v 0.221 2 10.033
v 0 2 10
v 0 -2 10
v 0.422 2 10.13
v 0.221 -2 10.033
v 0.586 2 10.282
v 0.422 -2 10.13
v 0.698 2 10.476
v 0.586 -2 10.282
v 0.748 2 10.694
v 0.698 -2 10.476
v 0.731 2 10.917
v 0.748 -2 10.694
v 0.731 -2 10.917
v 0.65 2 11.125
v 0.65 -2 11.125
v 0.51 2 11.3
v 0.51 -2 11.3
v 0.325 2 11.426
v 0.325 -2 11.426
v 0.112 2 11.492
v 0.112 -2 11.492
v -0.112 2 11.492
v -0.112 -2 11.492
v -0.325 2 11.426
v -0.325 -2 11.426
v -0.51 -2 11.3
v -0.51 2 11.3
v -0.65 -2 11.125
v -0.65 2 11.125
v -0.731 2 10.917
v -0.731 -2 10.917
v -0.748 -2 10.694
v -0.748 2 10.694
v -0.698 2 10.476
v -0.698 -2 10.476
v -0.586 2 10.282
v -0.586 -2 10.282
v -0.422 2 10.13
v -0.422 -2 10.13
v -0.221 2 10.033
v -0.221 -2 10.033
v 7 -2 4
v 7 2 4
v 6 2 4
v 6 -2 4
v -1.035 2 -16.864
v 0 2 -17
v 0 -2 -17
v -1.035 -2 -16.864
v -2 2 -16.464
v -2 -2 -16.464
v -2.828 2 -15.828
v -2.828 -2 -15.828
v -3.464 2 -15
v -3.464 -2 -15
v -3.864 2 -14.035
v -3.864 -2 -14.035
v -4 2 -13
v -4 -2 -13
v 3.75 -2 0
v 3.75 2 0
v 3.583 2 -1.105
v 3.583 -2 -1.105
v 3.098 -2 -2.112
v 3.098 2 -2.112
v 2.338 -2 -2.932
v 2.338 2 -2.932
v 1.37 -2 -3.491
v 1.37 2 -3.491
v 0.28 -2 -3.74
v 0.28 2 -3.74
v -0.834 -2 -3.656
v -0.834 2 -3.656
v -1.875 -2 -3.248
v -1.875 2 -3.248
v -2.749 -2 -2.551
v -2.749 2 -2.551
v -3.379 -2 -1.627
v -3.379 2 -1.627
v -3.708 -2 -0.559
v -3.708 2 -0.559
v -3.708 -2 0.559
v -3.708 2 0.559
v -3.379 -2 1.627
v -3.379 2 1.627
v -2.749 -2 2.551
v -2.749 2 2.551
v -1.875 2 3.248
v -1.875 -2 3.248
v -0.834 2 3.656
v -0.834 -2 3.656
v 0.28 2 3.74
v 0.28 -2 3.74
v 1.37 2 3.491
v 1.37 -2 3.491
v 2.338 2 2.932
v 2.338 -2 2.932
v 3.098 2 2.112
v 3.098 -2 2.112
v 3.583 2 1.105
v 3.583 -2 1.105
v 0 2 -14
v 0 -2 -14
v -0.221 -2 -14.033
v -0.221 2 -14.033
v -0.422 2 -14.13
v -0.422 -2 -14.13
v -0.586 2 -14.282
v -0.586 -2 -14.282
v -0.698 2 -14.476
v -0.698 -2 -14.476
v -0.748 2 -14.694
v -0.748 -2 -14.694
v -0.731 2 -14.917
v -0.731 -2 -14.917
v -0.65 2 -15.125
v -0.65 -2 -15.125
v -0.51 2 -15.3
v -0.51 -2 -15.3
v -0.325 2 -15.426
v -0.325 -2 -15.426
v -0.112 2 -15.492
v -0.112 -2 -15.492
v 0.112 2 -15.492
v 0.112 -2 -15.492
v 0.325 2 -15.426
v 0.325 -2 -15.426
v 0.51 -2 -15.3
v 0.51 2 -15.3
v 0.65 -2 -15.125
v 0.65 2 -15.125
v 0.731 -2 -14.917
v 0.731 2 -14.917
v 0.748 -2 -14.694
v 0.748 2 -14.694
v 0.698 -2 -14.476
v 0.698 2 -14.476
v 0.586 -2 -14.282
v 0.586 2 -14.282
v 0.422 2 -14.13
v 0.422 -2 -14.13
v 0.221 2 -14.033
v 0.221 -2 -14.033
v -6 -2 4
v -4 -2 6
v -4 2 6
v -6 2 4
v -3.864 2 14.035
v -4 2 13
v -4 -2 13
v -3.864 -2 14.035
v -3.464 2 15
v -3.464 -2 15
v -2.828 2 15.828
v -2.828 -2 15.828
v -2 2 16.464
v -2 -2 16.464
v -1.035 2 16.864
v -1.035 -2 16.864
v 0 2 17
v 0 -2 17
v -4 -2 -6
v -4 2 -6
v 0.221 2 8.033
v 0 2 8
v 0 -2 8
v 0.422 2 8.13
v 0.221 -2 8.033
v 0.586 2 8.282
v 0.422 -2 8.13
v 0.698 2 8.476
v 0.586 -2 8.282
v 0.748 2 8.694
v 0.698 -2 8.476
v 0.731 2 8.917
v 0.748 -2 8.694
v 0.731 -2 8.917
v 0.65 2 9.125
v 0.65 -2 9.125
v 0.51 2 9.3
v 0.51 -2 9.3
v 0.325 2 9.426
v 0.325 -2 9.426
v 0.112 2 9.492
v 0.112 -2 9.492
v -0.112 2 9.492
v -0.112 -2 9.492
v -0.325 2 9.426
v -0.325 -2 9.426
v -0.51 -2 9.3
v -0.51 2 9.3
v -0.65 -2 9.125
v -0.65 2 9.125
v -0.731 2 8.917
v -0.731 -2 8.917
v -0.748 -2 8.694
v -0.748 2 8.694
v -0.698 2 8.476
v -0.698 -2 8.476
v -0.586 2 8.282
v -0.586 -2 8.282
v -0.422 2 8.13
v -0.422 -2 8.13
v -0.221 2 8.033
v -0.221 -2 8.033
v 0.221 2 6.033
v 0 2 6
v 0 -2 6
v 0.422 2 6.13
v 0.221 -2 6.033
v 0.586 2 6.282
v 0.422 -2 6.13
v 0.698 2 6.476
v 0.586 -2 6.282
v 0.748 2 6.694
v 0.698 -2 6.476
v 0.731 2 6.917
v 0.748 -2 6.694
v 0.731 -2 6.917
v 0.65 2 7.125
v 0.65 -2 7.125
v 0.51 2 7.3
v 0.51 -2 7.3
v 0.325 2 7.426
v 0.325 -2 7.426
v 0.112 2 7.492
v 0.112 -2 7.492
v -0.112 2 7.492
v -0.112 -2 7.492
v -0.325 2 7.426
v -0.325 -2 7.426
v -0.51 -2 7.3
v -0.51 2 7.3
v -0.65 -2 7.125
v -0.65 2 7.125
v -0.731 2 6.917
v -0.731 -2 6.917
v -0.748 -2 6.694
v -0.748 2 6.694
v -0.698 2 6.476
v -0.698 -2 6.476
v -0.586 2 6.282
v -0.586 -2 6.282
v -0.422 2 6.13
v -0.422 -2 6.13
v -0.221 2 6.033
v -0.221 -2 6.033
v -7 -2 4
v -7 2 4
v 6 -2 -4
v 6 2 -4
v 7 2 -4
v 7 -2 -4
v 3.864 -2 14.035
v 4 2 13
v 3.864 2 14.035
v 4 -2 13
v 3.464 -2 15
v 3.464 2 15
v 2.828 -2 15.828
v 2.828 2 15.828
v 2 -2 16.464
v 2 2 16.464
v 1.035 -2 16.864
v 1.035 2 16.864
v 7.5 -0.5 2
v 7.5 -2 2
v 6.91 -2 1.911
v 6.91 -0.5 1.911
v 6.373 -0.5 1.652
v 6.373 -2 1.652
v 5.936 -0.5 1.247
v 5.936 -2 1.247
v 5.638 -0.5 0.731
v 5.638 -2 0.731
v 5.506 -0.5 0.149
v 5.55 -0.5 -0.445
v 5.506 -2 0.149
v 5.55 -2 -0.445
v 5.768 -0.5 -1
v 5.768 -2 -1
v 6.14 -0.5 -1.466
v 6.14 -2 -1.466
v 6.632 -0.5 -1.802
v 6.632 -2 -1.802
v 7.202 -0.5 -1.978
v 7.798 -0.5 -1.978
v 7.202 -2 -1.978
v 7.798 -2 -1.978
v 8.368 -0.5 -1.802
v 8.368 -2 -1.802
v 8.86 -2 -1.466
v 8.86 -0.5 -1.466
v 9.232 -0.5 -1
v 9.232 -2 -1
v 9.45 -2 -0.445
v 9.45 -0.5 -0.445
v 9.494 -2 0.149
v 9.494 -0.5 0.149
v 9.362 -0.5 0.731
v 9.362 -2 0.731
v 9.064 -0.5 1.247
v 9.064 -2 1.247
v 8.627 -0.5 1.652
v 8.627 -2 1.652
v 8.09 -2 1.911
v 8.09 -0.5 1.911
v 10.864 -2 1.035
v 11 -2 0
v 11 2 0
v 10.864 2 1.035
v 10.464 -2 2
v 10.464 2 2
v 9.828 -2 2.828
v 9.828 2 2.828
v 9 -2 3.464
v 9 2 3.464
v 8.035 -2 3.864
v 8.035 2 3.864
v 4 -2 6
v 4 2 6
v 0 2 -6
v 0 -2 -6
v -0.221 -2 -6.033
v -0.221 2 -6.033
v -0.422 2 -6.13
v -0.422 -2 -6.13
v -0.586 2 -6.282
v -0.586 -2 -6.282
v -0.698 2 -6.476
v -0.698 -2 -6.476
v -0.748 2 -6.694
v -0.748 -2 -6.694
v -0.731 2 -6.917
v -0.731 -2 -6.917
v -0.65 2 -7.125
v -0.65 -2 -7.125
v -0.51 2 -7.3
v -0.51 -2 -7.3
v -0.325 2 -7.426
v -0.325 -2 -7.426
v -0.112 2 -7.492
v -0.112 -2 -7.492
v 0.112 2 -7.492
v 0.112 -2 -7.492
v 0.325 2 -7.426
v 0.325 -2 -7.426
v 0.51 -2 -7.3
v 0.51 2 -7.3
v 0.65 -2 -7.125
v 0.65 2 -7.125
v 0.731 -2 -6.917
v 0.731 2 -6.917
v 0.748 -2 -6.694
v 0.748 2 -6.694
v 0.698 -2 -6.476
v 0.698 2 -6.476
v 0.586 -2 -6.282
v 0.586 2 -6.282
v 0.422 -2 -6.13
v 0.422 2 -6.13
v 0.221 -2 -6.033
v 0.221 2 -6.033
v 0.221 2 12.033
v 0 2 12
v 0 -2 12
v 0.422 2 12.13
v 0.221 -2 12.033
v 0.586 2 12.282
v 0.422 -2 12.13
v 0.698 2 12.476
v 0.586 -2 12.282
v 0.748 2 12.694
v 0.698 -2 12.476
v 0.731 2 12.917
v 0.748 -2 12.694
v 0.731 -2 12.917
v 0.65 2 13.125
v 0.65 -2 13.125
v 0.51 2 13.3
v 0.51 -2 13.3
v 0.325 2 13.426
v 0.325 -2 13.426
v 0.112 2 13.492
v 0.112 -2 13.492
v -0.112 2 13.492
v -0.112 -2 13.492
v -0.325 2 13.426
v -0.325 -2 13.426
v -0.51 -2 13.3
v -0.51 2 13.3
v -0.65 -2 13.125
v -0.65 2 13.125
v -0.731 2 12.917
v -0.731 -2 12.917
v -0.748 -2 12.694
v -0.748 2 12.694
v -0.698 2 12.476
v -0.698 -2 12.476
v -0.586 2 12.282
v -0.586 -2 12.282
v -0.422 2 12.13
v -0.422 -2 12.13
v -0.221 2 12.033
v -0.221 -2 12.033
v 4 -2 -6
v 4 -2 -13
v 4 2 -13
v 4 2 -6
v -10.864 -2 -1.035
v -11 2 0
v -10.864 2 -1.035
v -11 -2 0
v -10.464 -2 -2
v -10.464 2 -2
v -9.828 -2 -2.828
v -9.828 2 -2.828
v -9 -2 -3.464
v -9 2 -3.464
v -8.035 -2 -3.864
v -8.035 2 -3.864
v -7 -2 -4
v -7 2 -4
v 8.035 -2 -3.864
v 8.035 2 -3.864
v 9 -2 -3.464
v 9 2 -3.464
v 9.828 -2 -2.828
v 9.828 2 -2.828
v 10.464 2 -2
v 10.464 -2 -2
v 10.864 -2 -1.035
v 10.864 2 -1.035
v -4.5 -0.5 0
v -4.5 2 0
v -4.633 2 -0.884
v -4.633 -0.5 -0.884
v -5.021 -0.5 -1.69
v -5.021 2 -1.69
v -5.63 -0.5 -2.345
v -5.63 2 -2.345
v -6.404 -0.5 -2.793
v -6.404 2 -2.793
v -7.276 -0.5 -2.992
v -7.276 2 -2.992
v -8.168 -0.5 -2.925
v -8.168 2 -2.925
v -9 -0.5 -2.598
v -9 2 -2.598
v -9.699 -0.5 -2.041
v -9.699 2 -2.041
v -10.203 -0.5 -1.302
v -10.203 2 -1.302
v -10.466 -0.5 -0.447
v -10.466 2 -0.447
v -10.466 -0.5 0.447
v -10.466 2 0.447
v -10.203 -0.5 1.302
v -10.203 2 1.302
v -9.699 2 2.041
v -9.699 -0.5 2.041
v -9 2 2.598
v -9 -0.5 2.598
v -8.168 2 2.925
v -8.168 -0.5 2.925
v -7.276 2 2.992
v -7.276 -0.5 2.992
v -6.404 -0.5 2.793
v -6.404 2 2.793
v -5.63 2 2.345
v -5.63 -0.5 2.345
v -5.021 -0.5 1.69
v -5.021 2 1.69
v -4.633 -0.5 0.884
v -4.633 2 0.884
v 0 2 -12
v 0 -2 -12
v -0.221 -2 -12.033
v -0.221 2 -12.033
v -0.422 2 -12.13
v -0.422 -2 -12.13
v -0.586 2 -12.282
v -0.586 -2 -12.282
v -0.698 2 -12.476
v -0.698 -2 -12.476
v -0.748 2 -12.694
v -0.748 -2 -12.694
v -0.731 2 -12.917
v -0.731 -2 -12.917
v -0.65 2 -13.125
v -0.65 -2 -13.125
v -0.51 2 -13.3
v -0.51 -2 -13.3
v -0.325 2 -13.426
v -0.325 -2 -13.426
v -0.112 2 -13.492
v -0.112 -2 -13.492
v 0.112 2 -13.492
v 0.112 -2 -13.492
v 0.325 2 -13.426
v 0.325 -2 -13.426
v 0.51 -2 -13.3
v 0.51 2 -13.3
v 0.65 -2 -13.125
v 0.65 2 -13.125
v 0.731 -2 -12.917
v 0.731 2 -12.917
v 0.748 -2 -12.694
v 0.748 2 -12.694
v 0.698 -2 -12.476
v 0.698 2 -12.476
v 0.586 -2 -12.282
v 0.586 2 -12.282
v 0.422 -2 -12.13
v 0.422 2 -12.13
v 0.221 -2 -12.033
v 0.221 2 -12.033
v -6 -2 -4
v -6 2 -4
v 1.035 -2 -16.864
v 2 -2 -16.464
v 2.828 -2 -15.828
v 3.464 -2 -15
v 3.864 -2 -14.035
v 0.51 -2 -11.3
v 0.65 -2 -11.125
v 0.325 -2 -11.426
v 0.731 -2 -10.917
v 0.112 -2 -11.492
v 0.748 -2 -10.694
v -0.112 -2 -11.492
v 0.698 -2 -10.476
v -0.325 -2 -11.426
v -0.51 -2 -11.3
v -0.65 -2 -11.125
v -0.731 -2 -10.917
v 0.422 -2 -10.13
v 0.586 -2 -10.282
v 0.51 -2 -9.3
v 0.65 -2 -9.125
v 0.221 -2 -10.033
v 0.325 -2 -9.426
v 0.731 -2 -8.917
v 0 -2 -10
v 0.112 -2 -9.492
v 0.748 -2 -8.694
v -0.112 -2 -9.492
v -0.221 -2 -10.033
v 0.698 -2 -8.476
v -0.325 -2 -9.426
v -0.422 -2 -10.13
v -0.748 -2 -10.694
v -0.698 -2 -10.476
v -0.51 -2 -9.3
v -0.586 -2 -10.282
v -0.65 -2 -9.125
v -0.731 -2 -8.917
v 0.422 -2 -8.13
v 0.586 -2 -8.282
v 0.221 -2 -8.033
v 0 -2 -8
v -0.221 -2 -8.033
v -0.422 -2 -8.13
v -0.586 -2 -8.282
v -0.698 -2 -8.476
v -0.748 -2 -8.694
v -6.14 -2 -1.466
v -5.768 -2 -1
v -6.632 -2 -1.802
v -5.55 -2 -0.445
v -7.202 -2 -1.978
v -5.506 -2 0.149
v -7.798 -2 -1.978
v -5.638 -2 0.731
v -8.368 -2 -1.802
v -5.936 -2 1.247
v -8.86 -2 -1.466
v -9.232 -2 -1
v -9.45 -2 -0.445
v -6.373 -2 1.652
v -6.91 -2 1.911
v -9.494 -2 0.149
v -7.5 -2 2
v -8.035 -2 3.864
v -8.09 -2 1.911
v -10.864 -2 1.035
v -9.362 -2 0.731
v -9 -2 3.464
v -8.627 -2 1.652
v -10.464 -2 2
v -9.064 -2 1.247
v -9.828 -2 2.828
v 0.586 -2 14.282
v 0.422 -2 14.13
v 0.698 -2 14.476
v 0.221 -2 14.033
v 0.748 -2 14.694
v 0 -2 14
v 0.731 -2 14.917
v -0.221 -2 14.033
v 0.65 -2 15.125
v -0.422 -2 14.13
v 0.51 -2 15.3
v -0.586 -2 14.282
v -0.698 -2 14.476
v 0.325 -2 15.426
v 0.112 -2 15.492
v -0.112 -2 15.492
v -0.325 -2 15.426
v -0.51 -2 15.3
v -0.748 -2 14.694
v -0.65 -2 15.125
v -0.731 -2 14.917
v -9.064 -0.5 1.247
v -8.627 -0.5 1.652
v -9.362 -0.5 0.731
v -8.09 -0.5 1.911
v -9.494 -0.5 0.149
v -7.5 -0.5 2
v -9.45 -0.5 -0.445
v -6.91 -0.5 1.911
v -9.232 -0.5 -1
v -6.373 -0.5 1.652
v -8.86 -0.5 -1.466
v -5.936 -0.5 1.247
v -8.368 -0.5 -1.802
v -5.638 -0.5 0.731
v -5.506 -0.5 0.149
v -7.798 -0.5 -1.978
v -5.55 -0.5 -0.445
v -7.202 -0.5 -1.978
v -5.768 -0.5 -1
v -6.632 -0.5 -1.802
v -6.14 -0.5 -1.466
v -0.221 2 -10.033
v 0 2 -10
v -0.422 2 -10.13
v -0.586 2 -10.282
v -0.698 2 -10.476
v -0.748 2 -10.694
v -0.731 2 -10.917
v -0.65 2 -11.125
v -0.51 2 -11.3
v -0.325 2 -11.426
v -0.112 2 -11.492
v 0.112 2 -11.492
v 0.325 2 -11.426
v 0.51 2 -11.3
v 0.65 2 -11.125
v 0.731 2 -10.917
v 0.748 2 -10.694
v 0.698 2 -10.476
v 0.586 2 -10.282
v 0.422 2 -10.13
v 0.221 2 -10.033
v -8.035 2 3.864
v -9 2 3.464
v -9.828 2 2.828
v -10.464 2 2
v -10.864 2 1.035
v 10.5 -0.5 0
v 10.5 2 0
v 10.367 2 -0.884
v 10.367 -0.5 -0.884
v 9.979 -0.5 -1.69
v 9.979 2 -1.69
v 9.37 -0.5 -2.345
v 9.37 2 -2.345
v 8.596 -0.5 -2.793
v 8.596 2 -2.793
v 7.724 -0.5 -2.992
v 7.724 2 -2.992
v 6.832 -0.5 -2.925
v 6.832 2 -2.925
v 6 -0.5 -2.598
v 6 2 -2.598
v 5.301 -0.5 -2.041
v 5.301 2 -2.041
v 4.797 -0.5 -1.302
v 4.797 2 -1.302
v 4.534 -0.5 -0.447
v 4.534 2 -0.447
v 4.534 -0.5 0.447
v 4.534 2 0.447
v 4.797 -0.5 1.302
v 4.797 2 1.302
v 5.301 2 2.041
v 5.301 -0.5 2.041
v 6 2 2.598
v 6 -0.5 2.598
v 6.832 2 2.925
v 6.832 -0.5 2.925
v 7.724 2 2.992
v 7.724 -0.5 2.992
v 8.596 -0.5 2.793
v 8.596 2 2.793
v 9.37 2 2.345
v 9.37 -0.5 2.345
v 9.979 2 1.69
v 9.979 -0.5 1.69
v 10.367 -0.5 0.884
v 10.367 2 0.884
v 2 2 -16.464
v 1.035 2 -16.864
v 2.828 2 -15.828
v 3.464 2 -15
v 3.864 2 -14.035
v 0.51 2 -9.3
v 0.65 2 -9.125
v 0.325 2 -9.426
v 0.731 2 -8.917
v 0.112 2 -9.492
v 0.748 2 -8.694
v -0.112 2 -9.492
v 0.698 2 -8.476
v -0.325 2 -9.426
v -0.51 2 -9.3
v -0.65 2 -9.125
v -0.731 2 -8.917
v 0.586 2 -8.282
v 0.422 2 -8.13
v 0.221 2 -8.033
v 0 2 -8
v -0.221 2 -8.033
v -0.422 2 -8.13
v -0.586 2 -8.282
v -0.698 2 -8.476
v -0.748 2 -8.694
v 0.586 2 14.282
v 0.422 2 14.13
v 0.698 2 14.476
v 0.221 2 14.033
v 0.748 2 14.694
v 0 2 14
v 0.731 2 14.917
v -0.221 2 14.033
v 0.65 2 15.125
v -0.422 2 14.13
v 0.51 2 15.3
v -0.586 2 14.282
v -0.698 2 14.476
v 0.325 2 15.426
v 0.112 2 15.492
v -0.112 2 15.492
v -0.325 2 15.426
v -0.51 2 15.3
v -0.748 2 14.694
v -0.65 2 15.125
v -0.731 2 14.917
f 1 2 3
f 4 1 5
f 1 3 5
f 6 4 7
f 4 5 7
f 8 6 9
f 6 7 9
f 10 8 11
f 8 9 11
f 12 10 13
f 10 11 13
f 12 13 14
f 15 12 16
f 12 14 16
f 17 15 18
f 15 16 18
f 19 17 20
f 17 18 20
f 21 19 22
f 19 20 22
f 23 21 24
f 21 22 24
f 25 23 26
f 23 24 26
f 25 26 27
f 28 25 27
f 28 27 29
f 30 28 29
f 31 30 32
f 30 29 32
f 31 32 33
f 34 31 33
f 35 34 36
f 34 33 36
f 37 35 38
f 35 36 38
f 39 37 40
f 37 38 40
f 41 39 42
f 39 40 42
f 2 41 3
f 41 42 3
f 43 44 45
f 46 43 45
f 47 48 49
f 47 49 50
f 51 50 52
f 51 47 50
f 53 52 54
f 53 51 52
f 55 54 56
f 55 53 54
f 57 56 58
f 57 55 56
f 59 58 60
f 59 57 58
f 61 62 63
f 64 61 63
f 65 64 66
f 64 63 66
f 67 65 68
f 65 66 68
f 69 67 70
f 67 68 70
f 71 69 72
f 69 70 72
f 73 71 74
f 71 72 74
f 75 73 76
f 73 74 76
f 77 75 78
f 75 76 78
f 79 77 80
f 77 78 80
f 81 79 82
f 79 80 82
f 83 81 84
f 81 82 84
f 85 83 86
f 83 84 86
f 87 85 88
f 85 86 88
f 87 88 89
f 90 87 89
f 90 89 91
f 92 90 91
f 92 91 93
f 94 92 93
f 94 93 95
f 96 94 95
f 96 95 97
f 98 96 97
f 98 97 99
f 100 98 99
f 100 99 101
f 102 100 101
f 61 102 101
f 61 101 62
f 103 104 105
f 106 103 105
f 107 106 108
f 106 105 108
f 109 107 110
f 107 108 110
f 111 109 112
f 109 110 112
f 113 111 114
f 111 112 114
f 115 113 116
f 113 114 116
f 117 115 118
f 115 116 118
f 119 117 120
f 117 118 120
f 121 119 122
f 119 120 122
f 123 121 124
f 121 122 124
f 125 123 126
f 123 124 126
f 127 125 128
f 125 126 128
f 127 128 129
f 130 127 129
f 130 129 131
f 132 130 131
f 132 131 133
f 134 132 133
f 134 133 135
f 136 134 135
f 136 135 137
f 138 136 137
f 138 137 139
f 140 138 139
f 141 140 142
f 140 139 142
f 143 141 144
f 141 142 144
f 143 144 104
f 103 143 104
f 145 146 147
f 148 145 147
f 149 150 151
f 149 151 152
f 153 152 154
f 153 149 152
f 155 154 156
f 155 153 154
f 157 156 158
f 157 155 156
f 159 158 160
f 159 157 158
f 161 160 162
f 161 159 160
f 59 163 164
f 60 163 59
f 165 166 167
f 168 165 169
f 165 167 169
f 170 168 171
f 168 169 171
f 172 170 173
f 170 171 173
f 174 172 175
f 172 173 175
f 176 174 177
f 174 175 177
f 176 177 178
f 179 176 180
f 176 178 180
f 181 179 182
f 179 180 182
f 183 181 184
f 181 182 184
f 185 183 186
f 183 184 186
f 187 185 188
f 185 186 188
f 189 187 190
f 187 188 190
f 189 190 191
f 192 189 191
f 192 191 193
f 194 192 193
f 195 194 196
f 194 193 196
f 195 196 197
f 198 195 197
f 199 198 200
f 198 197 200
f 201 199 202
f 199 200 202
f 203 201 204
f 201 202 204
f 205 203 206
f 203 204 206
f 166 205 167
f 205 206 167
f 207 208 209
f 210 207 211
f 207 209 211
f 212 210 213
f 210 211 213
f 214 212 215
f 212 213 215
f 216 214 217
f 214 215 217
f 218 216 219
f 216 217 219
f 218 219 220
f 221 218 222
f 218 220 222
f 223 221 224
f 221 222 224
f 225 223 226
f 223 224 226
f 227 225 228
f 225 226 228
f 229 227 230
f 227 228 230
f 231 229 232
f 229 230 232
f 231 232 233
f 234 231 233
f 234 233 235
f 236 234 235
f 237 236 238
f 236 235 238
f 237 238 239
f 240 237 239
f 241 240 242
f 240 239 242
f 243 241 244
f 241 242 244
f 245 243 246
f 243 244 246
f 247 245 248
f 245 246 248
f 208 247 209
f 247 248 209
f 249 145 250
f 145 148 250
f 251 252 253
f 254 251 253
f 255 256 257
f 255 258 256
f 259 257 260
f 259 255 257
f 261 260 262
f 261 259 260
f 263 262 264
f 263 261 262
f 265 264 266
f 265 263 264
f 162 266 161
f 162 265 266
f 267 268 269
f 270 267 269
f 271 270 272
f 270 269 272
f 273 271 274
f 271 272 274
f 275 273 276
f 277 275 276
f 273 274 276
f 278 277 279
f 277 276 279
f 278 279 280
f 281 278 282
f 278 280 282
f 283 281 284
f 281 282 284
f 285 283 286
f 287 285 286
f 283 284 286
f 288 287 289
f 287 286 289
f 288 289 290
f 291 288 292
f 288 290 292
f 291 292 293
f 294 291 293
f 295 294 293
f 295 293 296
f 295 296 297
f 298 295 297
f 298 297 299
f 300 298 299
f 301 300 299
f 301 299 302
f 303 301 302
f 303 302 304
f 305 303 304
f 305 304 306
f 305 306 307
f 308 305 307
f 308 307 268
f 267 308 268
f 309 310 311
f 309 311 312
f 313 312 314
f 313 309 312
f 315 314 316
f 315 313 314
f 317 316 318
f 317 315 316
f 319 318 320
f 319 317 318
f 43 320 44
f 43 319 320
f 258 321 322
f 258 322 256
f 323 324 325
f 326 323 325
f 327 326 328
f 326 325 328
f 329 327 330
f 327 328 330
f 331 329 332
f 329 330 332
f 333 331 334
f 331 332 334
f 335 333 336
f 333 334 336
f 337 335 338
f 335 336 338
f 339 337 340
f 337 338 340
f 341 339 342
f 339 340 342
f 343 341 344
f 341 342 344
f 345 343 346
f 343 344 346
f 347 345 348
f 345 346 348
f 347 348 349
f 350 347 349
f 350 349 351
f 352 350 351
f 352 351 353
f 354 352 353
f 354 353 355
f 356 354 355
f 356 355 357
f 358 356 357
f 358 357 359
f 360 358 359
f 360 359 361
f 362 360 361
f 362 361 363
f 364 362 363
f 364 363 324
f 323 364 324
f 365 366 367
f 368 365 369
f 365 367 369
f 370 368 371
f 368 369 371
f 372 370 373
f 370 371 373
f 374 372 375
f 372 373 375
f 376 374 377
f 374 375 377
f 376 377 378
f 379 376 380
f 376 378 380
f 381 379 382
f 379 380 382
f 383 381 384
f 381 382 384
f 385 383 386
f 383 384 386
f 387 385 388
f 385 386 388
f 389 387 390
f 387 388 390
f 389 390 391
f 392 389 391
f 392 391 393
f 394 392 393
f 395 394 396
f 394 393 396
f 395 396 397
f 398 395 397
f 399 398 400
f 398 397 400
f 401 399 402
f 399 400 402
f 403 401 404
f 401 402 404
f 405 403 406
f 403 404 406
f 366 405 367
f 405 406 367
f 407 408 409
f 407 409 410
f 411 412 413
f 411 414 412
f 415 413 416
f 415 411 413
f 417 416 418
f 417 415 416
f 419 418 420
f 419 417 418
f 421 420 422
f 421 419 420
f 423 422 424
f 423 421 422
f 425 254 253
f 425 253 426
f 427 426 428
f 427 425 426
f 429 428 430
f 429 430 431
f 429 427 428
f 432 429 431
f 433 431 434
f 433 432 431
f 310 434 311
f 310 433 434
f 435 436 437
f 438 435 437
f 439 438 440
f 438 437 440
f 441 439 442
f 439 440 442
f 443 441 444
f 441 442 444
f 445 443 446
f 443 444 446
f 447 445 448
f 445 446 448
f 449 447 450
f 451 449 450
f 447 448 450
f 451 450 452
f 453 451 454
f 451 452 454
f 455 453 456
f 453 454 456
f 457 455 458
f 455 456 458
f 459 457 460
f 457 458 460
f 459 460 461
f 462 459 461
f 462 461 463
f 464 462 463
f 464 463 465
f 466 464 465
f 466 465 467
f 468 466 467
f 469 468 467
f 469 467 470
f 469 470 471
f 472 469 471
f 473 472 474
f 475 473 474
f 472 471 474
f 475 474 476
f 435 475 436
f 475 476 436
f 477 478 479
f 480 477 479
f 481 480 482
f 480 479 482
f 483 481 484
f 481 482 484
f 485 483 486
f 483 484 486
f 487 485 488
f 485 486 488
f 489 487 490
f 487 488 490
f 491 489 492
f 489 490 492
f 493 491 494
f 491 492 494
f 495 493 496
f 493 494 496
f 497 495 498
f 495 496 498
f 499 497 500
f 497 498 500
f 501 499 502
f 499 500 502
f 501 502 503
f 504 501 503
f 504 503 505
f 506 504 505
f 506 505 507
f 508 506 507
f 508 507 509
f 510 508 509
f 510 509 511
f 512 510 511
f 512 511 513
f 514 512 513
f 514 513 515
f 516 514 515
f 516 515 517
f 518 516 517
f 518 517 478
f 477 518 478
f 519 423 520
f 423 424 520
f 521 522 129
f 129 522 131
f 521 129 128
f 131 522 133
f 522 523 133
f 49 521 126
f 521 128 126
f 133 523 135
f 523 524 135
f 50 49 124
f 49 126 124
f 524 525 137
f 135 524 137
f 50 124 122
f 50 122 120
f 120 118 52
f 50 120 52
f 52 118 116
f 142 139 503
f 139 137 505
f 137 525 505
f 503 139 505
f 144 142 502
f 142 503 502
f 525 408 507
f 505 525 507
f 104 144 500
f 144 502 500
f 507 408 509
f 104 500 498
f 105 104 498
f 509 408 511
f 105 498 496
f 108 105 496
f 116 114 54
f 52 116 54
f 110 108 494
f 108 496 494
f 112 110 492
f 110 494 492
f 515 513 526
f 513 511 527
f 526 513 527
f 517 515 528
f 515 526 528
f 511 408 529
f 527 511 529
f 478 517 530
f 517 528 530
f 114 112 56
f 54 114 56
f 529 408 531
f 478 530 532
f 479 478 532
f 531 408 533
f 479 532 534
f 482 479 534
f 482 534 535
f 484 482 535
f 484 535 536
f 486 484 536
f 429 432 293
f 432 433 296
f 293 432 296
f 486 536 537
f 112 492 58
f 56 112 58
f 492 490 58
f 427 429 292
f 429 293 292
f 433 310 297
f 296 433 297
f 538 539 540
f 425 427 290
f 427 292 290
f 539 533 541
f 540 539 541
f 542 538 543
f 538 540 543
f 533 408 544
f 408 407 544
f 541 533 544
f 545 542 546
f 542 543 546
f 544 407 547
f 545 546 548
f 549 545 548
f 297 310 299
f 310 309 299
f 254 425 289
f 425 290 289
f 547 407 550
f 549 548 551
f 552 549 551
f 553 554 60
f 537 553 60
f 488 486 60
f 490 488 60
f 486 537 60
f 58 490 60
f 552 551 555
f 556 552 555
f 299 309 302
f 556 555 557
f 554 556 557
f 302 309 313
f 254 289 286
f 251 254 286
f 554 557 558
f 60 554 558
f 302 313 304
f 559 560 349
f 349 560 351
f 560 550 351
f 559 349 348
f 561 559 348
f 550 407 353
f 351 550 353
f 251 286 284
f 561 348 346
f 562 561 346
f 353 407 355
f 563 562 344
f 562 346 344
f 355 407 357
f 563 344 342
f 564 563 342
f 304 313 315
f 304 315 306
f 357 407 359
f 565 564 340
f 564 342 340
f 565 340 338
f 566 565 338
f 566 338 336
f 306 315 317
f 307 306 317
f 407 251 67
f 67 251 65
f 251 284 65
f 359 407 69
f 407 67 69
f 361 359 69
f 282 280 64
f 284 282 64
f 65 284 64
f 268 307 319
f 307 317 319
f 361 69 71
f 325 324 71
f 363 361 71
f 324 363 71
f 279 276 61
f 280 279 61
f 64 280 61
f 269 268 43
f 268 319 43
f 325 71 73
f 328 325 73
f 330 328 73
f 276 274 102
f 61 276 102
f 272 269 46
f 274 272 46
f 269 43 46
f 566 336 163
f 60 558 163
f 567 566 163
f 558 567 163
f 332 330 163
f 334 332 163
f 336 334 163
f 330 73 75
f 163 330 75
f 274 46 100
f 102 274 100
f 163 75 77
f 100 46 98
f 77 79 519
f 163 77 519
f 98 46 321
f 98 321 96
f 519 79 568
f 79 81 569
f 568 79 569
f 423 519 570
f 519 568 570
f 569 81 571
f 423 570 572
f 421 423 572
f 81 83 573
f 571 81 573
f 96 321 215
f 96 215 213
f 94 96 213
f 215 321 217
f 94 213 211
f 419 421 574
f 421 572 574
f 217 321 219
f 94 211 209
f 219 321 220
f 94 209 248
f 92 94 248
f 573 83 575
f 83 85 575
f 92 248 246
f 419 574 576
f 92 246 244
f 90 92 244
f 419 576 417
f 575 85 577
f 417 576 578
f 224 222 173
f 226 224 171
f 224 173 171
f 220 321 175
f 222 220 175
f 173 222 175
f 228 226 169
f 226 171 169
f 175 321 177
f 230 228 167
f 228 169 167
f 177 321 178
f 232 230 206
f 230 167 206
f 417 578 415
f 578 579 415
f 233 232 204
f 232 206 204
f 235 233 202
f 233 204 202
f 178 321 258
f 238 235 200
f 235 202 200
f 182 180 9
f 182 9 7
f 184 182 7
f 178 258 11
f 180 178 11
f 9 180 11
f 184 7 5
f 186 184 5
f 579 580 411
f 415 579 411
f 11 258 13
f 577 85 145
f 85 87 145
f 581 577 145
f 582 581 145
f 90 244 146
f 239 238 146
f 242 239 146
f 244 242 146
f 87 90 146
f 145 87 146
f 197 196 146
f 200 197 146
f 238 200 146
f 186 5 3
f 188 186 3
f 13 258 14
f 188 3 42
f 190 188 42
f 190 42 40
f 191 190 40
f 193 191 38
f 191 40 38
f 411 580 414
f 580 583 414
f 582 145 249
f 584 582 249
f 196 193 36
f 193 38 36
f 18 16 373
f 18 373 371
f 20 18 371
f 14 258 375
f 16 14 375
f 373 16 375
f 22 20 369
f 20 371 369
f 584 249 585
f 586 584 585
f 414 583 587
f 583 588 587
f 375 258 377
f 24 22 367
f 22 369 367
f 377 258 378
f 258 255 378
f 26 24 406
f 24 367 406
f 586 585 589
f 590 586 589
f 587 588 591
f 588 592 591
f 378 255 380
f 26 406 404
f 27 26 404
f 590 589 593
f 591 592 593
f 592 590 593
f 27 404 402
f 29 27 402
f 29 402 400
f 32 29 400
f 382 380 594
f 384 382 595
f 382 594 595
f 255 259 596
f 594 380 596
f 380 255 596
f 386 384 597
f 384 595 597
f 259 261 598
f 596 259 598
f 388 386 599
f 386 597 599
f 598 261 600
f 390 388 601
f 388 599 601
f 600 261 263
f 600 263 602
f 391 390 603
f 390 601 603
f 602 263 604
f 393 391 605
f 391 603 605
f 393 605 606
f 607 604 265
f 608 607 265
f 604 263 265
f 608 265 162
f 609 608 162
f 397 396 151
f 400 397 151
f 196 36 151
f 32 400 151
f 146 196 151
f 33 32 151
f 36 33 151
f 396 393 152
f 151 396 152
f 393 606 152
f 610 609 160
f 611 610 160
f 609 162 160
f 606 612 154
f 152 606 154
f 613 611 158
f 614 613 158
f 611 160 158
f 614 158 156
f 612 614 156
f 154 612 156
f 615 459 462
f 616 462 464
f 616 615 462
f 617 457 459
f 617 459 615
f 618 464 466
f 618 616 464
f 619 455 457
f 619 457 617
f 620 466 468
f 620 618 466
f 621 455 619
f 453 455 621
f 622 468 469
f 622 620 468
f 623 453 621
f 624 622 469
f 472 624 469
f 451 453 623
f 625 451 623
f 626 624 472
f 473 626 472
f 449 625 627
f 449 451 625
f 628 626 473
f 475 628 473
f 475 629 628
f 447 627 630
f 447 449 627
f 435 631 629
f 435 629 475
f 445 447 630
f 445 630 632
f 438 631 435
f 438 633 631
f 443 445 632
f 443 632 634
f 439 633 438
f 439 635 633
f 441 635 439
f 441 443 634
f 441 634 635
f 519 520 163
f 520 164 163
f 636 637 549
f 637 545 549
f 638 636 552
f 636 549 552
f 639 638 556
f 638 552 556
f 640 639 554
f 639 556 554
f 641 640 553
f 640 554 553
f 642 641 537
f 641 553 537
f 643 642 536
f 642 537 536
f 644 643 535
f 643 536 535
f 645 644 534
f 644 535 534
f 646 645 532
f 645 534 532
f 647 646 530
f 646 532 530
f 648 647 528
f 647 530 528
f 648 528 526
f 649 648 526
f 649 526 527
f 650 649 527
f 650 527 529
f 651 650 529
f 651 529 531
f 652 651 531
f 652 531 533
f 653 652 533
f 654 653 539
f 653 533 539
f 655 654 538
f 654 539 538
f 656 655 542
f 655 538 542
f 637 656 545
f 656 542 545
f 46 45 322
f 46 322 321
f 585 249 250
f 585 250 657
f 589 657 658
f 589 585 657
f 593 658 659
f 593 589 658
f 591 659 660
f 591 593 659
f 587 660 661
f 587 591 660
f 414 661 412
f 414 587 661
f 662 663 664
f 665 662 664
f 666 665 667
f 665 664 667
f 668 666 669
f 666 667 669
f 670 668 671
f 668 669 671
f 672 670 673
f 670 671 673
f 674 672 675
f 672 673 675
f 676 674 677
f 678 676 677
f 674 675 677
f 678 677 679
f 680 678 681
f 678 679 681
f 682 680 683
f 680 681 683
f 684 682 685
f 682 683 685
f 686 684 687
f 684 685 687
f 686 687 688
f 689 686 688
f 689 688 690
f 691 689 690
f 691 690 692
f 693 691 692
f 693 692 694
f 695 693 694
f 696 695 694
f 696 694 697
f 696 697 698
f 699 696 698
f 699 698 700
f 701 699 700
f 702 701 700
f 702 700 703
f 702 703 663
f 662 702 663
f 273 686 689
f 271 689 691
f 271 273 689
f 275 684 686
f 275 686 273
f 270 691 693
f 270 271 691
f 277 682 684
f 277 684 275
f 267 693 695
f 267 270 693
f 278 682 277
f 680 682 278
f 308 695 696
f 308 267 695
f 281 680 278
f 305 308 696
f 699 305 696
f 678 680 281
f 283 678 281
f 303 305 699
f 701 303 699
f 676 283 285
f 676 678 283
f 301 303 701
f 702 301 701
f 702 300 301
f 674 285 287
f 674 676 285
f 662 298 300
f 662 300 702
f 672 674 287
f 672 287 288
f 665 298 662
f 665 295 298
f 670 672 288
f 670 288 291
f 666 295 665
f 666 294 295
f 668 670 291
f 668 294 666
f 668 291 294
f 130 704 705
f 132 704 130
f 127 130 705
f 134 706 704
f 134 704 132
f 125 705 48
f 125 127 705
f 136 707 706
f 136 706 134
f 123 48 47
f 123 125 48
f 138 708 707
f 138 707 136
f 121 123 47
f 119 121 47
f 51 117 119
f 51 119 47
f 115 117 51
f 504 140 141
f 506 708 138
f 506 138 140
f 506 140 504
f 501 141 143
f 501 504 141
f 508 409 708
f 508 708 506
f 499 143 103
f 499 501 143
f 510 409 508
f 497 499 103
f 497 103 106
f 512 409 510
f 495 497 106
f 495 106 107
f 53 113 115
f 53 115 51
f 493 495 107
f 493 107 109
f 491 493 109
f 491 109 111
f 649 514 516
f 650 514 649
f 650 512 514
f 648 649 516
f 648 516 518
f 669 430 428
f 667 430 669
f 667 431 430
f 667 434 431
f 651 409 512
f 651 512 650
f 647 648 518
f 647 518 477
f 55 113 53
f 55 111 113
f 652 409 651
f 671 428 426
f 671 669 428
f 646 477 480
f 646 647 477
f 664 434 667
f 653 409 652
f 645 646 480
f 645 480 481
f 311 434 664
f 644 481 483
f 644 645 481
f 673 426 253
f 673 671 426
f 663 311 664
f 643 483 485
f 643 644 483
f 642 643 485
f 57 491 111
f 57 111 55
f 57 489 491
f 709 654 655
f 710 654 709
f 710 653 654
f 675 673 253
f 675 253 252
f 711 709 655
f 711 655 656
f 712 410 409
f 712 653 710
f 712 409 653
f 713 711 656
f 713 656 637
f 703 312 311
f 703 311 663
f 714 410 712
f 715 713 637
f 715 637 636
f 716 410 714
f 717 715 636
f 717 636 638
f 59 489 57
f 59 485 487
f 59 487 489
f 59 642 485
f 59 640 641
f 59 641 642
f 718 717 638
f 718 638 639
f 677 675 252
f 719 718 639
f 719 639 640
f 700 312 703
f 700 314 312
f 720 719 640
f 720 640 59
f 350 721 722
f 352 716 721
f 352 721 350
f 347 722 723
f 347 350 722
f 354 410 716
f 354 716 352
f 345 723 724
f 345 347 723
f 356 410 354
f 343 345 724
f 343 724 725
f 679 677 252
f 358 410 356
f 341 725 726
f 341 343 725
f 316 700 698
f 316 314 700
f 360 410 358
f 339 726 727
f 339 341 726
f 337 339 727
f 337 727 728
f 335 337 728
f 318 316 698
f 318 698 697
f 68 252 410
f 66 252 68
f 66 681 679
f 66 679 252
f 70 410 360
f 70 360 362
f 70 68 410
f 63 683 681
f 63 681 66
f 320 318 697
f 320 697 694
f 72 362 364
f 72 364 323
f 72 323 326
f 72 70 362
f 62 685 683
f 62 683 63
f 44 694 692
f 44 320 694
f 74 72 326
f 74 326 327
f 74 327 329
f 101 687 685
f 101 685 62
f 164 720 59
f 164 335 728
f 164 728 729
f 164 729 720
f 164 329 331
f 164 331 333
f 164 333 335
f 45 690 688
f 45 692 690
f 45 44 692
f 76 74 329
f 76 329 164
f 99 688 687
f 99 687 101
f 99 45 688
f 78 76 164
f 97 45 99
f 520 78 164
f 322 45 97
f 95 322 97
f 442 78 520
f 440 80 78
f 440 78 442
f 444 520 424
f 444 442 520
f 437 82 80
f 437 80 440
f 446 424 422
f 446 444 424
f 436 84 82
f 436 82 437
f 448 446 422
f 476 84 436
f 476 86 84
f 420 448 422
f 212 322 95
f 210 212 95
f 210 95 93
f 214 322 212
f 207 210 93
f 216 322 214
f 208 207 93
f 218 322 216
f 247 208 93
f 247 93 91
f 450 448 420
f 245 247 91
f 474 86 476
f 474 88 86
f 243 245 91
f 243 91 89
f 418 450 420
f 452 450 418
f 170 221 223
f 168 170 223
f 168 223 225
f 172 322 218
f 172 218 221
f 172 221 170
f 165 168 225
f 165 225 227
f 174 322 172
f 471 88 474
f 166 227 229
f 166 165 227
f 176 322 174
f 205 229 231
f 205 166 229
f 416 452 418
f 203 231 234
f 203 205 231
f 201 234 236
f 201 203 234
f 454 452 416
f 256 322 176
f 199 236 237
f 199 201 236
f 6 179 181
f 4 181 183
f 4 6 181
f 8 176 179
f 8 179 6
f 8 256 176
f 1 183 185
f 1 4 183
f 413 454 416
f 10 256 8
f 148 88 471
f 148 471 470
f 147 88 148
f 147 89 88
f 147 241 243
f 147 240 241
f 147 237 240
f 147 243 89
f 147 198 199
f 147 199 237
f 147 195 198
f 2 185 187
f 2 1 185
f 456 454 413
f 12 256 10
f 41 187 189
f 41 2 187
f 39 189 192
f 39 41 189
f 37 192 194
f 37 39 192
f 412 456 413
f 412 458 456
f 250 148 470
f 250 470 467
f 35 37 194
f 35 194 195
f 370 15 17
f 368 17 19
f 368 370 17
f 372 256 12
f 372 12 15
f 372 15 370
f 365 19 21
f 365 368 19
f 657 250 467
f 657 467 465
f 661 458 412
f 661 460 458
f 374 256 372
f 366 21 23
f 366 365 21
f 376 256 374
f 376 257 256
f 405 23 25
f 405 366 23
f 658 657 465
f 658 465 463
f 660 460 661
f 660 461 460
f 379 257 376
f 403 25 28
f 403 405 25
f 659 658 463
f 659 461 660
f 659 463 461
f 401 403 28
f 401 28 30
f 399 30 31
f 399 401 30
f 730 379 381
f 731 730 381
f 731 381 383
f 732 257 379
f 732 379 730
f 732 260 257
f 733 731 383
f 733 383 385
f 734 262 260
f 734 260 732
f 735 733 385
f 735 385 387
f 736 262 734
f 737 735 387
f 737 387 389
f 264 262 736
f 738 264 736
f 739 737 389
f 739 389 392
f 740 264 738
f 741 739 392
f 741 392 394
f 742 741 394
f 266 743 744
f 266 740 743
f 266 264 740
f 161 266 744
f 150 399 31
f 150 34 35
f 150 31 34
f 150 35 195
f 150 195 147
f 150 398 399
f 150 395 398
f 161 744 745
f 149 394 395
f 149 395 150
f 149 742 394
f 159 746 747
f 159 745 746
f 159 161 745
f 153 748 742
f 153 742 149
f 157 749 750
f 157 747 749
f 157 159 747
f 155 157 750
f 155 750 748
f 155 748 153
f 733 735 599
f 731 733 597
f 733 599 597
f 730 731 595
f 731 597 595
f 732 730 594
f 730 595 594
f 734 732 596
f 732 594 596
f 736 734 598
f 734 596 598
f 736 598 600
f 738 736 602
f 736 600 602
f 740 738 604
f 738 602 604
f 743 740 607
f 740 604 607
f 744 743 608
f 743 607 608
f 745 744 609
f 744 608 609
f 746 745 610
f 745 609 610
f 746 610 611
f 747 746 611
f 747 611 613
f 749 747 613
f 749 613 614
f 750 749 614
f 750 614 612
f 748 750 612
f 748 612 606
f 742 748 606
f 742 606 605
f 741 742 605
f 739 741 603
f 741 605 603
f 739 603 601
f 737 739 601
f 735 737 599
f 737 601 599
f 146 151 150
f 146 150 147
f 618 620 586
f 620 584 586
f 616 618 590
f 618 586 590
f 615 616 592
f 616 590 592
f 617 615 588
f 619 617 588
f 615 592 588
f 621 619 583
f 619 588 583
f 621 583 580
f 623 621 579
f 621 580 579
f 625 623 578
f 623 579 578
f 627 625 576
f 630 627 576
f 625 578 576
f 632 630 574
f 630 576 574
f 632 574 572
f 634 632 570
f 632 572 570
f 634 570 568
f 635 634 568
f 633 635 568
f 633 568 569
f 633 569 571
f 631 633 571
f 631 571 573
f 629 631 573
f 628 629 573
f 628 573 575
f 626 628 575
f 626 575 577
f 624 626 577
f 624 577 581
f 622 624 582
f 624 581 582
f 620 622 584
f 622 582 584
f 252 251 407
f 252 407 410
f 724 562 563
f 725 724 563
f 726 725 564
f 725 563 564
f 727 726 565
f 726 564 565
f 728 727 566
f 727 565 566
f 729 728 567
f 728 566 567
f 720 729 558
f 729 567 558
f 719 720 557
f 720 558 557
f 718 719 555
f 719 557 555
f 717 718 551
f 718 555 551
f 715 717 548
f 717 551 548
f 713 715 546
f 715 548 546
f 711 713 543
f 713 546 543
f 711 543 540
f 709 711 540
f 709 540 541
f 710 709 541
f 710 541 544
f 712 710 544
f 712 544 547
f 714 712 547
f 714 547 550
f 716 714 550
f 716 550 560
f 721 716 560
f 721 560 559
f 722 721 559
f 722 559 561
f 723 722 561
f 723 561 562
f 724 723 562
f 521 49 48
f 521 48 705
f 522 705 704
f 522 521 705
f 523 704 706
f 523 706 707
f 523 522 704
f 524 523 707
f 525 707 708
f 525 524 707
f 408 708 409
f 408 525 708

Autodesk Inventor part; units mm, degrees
ref_plane "YZ Plane" through (0, 0, 0) normal (1, 0, 0) x (0, 1, 0)
ref_plane "XZ Plane" through (0, 0, 0) normal (0, 1, 0) x (-1, 0, 0)
ref_plane "XY Plane" through (0, 0, 0) normal (0, 0, 1) x (1, 0, 0)
sketch "Sketch1" plane through (0, 0, 0) normal (0, 1, 0) x (-1, 0, 0)
  line L0 (4, -17) -> (-4, -17)
  line L1 (-4, -17) -> (-4, 0)
  line L2 (-4, 0) -> (4, 0)
  line L3 (4, 0) -> (4, -17)
  line L4 (4, -17) -> (-4, 0) construction
  line L5 (-4, -17) -> (4, 0) construction
  point P0 (0, 0)
  point P1 (0, -8.5)
  dimension "d0" = 8
  dimension "d1" = 17
  dimension "d19" = 0
  dimension "d20" = 0
extrude "Extrusion1" add sketch "Sketch1" along normal mid plane 4
sketch "Sketch2" plane through (0, 2, 0) normal (0, 1, 0) x (1, 0, 0)
  line L0 (-4, 17) -> (-4, 0) projected
  line L1 (-4, 0) -> (4, 0) projected
  line L2 (4, 0) -> (4, 17) projected
  line L3 (4, 17) -> (-4, 17) projected
  point P0 (0, 0)
  point P1 (0, 6.75)
  point P2 (0, 8.75)
  point P3 (0, 10.75)
  point P4 (0, 12.75)
  point P5 (0, 14.75)
  dimension "d4" = 6.75
  dimension "d7" = 2
hole "Hole1" at (0, 2, -6.75) at (0, 2, -8.75) at (0, 2, -10.75) at (0, 2, -12.75) at (0, 2, -14.75) direction (0, -1, 0) diameter 1.5 end through all
fillet "Fillet1" radius 4 2 edges at (-4, 0, -17) (4, 0, -17)
mirror "Mirror1" about plane through (0, 0, 0) normal (0, 0, 1) of "Extrusion1", "Hole1", "Fillet1"
sketch "Sketch3" plane through (0, 2, 0) normal (0, 1, 0) x (1, 0, 0)
  line L0 (11, -4) -> (4, -4)
  line L1 (4, -4) -> (4, 4)
  line L2 (4, 4) -> (11, 4)
  line L3 (11, 4) -> (11, -4)
  line L4 (11, -4) -> (4, 4) construction
  line L5 (4, -4) -> (11, 4) construction
  line L6 (4, 13) -> (4, -13) projected
  point P0 (0, 0)
  point P1 (7.5, 0)
  point P2 (4, -14)
  dimension "d22" = 0
  dimension "d23" = 0
  dimension "d24" = 8
  dimension "d25" = 7.5
extrude "Extrusion2" add sketch "Sketch3" against normal blind 4
fillet "Fillet2" radius 4 2 edges at (11, 0, -4) (11, 0, 4)
sketch "Sketch4" plane through (0, 2, 0) normal (0, 1, 0) x (1, 0, 0)
  point P0 (0, 0)
  point P1 (7.5, 0)
  dimension "d29" = 7.5
hole "Hole2" at (7.5, 2, 0) direction (0, -1, 0) diameter 4 end through all
mirror "Mirror2" about plane through (0, 0, 0) normal (1, 0, 0) of "Extrusion2", "Fillet2", "Hole2"
sketch "Sketch5" plane through (0, 2, 0) normal (0, 1, 0) x (1, 0, 0)
  circle A0 centre (0, 0) radius 3.75
  dimension "d37" = 7.5
extrude "Extrusion3" cut sketch "Sketch5" against normal through all
chamfer "Chamfer1" distance 2 angle 45 4 edges at (4, 0, 4) (-4, 0, 4) (-4, 0, -4) (4, 0, -4)
sketch "Sketch6" plane through (0, 2, 0) normal (0, 1, 0) x (1, 0, 0)
  circle A0 centre (0, 0) radius 3.75 projected
  circle A1 centre (-7.5, 0) radius 2 projected
  arc A2 (-7, 4) -> (-7, -4) centre (-7, 0) ccw projected
  line L0 (-6, -4) -> (-7, -4) projected
  line L1 (-4, -6) -> (-6, -4) projected
  line L2 (-4, -6) -> (-4, -13) projected
  arc A3 (-4, -13) -> (4, -13) centre (0, -13) ccw projected
  line L3 (4, -6) -> (4, -13) projected
  line L4 (6, -4) -> (4, -6) projected
  line L5 (6, -4) -> (7, -4) projected
  arc A4 (7, -4) -> (7, 4) centre (7, 0) ccw projected
  line L6 (7, 4) -> (6, 4) projected
  line L7 (4, 6) -> (6, 4) projected
  line L8 (4, 13) -> (4, 6) projected
  arc A5 (4, 13) -> (-4, 13) centre (0, 13) ccw projected
  line L9 (-4, 13) -> (-4, 6) projected
  line L10 (-6, 4) -> (-4, 6) projected
  line L11 (-7, 4) -> (-6, 4) projected
  circle A6 centre (7.5, 0) radius 2 projected
  circle A7 centre (0, 12.75) radius 0.75 projected
  circle A8 centre (0, 8.75) radius 0.75 projected
  circle A9 centre (0, 6.75) radius 0.75 projected
  circle A10 centre (0, 10.75) radius 0.75 projected
  circle A11 centre (0, 14.75) radius 0.75 projected
  circle A12 centre (0, -8.75) radius 0.75 projected
  circle A13 centre (0, -6.75) radius 0.75 projected
  circle A14 centre (0, -10.75) radius 0.75 projected
  circle A15 centre (0, -14.75) radius 0.75 projected
  circle A16 centre (0, -12.75) radius 0.75 projected
  circle A17 centre (-7.5, 0) radius 3
  circle A18 centre (7.5, 0) radius 3
  dimension "d43" = 6
  dimension "d44" = 6
extrude "Extrusion4" cut sketch "Sketch6" against normal blind 2.5 contours A17 | A18
properties part number "JointPlate3"
